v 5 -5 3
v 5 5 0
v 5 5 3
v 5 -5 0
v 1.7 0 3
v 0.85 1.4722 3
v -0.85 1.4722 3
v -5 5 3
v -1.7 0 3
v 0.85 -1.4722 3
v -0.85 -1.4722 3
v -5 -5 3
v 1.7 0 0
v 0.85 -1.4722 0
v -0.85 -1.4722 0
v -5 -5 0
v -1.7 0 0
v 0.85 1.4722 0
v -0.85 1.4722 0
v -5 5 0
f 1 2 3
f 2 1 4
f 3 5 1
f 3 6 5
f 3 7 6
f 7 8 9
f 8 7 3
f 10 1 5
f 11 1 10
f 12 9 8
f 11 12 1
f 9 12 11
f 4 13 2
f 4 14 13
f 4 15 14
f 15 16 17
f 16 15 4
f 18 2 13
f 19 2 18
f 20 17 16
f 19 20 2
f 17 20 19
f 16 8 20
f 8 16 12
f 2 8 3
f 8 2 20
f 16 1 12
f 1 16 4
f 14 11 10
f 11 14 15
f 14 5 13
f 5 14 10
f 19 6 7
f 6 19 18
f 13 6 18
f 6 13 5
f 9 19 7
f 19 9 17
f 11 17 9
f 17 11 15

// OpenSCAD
// file: util.scad
use <../buildvars.scad>

module screw_hole() {
	circle(r=screw_r()+tolerance());
}
// file: ../buildvars.scad
function cube_size() = 56;
function tolerance() = 0.2;
function screw_r() = 3/2;
function arm_width() = 7;
function arm_length() = 35;
function servo_base_height() = 4;
function servo_elevation() = 5;
function gear_r() = 11;
function arm_c2c() = gear_r()*2.35;

function arm_inset_x() = arm_width() + 2;
function arm_inset_y() = gear_r()+arm_width();

function back_x() = 4.31*2;
function back_y() = -gear_r()-10;
function base_rounding_radius() = 7;
function nut_h() = 2.3;

function grip_pad_h() = servo_base_height();

function back_h() = nut_h()+servo_elevation()+2*servo_base_height();
function gripper_r() = back_h()/2;
function turn_h() = 30;
function turn_gap_h() = 5;
function turn_gap_d() = 2;
function turn_br() = base_rounding_radius();
function turn_sr() = turn_br()/2;
function turn_mr() = (turn_br()+turn_sr())/2;
function turn_pad() = 2;
function turn_gear_r() = 6;



function sh_r() = 8/2;
function sh_h() = 3;
function sh_w() = 10;


function holder_h() = 80; // height to center
function holder_d() = turn_h();
function holder_th() = 8;
function holder_w() = gripper_r()*2+holder_th()*2;
function holder_dst() = 183;


function gears_c2c() = 36;
function gear_conversion_factor() = 1; // old = 0.67;
function gear_round() = true;

function base_r() = (gears_c2c()-3)/2;
function servo_gear_f() = 2/(gear_conversion_factor()+1)*gear_conversion_factor();
function turn_gear_f() = 2-servo_gear_f();
function turn_gear_r() = base_r() * turn_gear_f();
function servo_gear_r() = base_r() * servo_gear_f();

function rail_sep_w() = sh_w()/4;
// main file
use <../buildvars.scad>
use <util.scad>

module screw(h=4, hh=3) {
    translate([sh_w()/2,sh_w()/2,0]) {
        translate([0,0,hh])
        screw_holder(h=h);
        screw_head_padding(h=hh);
    }
}

module screwy(h,hh) {
    translate([0,0,sh_w()])
    rotate([-90,0,0])
    screw(h=h, hh=hh);
}



module 2screws(h,hh) {
    screwy(h,hh);
    translate([0,0,holder_d()-sh_w()])
    screwy(h,hh);
}

module 4screws(h=sh_h(),hh=3) {
    translate([-sh_w(),0,0])2screws(h,hh);
    translate([holder_w(),0,0]) 2screws(h,hh);
}

module screw_head_padding(h = sh_h()) {
    w = sh_w();
    r = sh_r();
    difference() {
        translate([0,0,h])
        cube([w,w,h*2],center=true);
        
        cylinder(r=r, h=h*2);
    }
}

module screw_holder(h) {
    w = sh_w();
    r = screw_r()+tolerance();
    difference() {
        translate([0,0,h/2])
        cube([w,w,h],center=true);
        
        cylinder(r=r, h=h);
    }
}

screw_holder(3);
